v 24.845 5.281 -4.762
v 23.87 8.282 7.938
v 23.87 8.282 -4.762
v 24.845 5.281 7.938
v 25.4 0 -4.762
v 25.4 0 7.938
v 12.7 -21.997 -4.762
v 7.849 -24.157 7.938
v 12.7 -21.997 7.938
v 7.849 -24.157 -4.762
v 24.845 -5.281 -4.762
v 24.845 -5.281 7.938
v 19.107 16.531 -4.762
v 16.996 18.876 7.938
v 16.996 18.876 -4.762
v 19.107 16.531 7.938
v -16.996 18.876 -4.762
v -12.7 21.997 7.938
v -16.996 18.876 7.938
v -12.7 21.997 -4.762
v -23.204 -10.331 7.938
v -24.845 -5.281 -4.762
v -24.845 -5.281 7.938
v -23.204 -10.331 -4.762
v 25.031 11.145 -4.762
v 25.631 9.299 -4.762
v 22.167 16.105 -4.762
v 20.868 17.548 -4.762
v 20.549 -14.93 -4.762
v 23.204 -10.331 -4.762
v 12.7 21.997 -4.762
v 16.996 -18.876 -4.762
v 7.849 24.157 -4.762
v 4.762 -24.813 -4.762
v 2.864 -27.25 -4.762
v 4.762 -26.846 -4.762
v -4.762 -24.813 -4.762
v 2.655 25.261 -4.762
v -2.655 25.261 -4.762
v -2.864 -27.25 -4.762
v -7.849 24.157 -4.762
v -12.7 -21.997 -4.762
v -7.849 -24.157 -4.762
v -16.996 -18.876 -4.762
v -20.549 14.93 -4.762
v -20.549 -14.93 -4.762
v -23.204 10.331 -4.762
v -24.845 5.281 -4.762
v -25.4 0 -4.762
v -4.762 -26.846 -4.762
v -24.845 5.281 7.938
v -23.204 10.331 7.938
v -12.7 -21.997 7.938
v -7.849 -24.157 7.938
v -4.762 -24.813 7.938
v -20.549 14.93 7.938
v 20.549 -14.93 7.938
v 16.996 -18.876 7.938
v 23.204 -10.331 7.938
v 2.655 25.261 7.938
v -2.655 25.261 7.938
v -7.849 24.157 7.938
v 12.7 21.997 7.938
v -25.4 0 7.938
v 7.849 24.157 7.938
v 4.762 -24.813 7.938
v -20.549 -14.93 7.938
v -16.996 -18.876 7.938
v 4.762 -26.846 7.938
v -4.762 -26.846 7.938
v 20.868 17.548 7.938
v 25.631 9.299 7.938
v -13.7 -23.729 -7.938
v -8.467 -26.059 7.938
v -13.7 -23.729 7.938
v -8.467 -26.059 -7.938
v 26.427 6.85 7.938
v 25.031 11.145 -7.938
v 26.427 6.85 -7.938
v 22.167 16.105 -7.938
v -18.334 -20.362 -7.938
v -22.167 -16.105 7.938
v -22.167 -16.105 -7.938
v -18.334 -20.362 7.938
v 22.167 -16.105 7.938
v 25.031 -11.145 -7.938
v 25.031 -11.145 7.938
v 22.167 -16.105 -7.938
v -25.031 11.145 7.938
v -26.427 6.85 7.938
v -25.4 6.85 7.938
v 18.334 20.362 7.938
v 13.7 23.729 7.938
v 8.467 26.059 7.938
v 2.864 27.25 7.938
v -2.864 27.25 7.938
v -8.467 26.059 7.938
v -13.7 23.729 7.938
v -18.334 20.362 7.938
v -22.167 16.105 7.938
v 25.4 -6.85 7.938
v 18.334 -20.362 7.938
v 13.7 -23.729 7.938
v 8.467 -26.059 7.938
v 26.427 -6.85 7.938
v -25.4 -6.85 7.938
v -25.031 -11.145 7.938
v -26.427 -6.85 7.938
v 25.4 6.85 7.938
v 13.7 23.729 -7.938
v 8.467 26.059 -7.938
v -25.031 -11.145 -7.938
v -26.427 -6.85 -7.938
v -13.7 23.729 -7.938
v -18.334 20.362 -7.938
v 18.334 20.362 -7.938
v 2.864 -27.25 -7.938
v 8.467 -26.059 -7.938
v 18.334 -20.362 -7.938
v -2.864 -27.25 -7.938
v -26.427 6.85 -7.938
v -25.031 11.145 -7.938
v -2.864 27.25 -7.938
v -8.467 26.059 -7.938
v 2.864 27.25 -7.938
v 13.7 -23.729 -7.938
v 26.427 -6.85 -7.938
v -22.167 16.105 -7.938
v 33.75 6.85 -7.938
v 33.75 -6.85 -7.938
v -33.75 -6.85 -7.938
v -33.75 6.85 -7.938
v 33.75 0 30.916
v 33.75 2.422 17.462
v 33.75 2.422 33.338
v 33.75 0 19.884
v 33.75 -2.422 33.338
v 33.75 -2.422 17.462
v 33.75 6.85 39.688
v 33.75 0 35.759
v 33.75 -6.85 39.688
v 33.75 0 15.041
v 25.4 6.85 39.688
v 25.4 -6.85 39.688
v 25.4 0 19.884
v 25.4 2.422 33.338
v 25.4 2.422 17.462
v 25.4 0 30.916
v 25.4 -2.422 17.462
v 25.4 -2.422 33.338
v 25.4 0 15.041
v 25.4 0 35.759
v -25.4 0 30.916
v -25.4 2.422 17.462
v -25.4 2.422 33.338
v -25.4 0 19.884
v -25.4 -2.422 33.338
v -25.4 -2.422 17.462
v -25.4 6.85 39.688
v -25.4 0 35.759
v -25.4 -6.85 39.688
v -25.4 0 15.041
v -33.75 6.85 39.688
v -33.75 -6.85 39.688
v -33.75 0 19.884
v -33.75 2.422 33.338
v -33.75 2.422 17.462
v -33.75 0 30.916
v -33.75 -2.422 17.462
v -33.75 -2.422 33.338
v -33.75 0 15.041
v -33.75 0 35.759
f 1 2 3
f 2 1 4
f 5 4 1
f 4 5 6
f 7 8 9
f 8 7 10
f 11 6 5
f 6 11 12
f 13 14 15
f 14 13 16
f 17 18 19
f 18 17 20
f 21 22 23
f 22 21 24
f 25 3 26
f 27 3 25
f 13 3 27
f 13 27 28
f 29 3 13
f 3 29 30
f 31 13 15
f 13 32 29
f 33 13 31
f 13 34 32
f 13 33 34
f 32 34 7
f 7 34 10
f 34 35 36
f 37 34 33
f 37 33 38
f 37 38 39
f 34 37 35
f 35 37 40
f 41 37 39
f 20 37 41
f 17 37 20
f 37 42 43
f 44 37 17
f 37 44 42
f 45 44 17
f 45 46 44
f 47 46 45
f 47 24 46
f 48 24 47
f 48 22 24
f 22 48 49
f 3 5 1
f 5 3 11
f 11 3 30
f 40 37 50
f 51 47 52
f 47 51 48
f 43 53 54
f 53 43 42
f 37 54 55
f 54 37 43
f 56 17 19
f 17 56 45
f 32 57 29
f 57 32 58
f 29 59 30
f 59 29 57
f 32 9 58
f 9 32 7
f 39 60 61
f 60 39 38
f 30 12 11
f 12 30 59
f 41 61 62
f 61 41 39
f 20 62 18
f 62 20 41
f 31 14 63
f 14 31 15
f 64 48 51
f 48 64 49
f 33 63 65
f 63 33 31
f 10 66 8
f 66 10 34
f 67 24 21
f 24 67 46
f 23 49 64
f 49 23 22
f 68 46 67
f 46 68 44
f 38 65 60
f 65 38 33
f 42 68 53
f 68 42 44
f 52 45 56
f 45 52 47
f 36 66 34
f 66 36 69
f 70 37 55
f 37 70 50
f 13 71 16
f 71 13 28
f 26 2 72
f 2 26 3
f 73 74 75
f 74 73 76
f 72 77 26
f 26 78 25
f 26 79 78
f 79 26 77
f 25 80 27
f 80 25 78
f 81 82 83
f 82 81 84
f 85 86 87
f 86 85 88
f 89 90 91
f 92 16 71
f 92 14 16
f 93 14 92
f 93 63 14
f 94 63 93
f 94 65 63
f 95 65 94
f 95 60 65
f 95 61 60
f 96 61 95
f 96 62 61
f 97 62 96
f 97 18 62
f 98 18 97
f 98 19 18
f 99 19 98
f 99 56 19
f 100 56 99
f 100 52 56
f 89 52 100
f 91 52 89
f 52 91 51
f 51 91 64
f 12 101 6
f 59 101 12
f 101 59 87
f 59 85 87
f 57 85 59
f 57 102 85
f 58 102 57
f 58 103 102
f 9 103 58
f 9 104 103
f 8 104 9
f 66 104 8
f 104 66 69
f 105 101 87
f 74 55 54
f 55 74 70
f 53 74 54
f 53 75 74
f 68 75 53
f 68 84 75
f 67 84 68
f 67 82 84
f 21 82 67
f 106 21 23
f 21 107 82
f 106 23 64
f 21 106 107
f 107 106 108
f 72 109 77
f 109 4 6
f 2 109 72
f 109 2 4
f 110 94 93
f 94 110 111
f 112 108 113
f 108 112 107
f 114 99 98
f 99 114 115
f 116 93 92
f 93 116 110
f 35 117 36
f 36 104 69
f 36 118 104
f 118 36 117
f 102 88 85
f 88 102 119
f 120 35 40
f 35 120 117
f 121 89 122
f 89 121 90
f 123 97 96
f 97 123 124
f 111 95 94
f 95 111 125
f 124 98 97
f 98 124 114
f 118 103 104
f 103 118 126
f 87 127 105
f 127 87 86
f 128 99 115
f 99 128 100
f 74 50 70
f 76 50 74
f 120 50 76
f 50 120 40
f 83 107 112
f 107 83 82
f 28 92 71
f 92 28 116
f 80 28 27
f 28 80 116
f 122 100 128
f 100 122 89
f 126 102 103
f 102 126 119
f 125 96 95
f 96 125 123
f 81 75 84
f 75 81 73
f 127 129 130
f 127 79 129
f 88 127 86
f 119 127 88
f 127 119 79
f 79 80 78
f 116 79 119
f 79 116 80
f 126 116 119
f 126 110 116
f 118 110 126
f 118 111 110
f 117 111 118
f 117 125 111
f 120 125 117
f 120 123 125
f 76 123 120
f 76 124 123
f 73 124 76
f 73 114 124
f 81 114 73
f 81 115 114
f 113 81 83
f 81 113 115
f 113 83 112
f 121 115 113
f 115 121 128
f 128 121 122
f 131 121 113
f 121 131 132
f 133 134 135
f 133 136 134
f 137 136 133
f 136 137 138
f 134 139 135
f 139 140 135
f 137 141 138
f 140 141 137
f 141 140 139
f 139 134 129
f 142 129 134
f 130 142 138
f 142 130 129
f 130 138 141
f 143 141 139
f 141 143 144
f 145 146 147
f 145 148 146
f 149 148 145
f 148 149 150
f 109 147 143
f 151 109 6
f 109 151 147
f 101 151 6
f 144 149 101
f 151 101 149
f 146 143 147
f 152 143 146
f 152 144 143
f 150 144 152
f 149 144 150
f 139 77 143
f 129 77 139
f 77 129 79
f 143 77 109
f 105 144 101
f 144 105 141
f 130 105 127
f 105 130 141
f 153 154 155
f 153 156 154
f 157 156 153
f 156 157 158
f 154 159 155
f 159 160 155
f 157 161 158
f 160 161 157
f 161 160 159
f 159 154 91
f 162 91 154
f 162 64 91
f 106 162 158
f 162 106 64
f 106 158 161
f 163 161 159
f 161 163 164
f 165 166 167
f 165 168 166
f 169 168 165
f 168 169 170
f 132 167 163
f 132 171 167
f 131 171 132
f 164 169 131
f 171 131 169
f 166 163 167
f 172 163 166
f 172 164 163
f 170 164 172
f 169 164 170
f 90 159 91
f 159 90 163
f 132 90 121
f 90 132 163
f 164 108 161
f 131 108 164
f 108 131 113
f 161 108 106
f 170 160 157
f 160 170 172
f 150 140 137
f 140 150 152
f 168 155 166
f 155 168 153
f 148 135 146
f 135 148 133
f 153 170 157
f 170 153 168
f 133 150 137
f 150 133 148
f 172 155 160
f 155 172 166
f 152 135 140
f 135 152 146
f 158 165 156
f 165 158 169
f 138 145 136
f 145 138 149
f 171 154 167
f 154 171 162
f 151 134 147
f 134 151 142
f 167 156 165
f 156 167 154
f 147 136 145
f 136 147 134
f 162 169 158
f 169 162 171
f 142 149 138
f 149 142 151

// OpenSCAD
// file: common.scad
// this contains functions and parameters common to both arm and hub files.

// converts x in inches to x in mm.
function i2mm(x) = x * 0.0254 * 1000;

// distance from hub center to first arm mount point. must be less than second arm mount point.
function first_mount_radius() = i2mm(1);

// distance from hub center to second arm mount point. must be greater than first arm mount point.
function second_mount_radius() = i2mm(2);

// diameter of hole for fasteners between arm and hub.
function hole_diam() = i2mm(1/8) + 0.25;

function arm_width() = i2mm(0.5);

// thickness of each of the 2 hub plates.
function hub_thickness() = i2mm(.25);

// thickness of each of arm plate.
function arm_thickness() = i2mm(0.25);

// distance between general-purpose mounting holes arranged in a square.
function gp_mount_dim() = i2mm(0.75);

// minimum distance to edge from general-purpose mounting holes.
function gp_mount_margin() = i2mm(0.125);

// overall width of pixhawk mount.
// nice to have all general-purpose modules (e.g. telemetry, gps, pixhawk) the same to avoid needing extra spacers for connecting them all to side struts.
function gp_module_width() = i2mm();

// makes the spacer that accomodates 1 arm plate and 1 hub plate.
module spacer() {
    // shell thickness of spacer that separates the motor from the top surface arm.
    spacer_thickness = 2;
    difference() {
        h = hub_thickness() + arm_thickness();
        od = hole_diam() + 2 * spacer_thickness;
        cube([od, od, h], center = true);
        id = hole_diam();
        cube([id, id, 2 * h], center = true);
    }
}
// main file
// Units are mm.

// Holds a Pixhawk 4 GPS module.
// Holes on the side can be used to mount bars that connect to the main mount.

use <common.scad>;

thickness = i2mm(0.125); // thickness of base plate, to which the hub is mounted.

module_diam = i2mm(2);

wall_thickness = 2;
wall_height = i2mm(1/2);

outlet_width = i2mm(3/8);
switch_width = i2mm(1/4);

module mount_pillars() {
    z = i2mm(1);
    dz =  i2mm(.625);
    h = 3 * dz;
    w = 4 * hole_diam();
    max_width = i2mm(2.5);
    extension = (max_width - module_diam) / 2;
    difference() {
        union() {
            translate([module_diam / 2 + wall_thickness / 2 + extension / 2, 0, h / 2 - (thickness + wall_height) / 2])
                cube(size = [extension + wall_thickness, w, h], center = true);
            translate([-(module_diam / 2 + wall_thickness / 2 + extension / 2), 0, h / 2 - (thickness + wall_height) / 2])
                cube(size = [extension + wall_thickness, w, h], center = true);
        }
        translate([0, 0, z + dz / 2])
            rotate([45, 0, 0])
                cube(size = [module_diam * 2, hole_diam(), hole_diam()], center = true);
        translate([0, 0, z - dz / 2])
            rotate([45, 0, 0])
                cube(size = [module_diam * 2, hole_diam(), hole_diam()], center = true);
    }
}

difference() {
    od = wall_thickness * 2 + module_diam;
    h = wall_height + thickness;
    cylinder(r = od / 2, h = h, center = true);
    translate([0, 0, thickness]) {
        cylinder(r = module_diam / 2, h = h, center = true);
        translate([0, -module_diam / 2, 0])
            cube(size = [outlet_width, module_diam, h], center = true);
        rotate([0, 0, 120])
            translate([0, -module_diam / 2, 0])
                cube(size = [outlet_width, module_diam, h], center = true);
    }
}
mount_pillars();
/*
difference() {
    union() {
        translate([0, 0, thickness / 2])
            walls();
        // main block
        cube(size = [module_diam + wall_thickness * 2, telem_length + wall_thickness * 2, thickness], center = true);
        mount_pillars();
    }
}
*/
